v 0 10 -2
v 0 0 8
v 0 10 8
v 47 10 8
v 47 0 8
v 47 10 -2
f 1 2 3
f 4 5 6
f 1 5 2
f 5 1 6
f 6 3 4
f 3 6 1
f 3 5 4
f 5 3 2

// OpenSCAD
module corner_support(width, height) {
    
    label_frame=3;
    label_height=height + label_frame;
    label_width=width + label_frame;

    union() {
        
        // Calculate the cube size for the difference by using the 
        // pythagorean theorem "Square root of a² and b²"
        holder_hyp=sqrt((height)^2 + (height)^2);
      
        // Create the support structure
        difference() {
            
            translate([0, height, -2])
            rotate([45,0,0])
            cube([width,holder_hyp,holder_hyp]);
        
            tmp=sqrt((holder_hyp)^2 + (holder_hyp)^2);
            color("red")
            translate([-1, height, -2])
            cube([width+4, tmp/2, tmp]);
            
            color("red")
            translate([-1, 0, height-2])
            cube([width+4, tmp/2+1, tmp/2]);  
        }
    }
}

corner_support(47, 10);
